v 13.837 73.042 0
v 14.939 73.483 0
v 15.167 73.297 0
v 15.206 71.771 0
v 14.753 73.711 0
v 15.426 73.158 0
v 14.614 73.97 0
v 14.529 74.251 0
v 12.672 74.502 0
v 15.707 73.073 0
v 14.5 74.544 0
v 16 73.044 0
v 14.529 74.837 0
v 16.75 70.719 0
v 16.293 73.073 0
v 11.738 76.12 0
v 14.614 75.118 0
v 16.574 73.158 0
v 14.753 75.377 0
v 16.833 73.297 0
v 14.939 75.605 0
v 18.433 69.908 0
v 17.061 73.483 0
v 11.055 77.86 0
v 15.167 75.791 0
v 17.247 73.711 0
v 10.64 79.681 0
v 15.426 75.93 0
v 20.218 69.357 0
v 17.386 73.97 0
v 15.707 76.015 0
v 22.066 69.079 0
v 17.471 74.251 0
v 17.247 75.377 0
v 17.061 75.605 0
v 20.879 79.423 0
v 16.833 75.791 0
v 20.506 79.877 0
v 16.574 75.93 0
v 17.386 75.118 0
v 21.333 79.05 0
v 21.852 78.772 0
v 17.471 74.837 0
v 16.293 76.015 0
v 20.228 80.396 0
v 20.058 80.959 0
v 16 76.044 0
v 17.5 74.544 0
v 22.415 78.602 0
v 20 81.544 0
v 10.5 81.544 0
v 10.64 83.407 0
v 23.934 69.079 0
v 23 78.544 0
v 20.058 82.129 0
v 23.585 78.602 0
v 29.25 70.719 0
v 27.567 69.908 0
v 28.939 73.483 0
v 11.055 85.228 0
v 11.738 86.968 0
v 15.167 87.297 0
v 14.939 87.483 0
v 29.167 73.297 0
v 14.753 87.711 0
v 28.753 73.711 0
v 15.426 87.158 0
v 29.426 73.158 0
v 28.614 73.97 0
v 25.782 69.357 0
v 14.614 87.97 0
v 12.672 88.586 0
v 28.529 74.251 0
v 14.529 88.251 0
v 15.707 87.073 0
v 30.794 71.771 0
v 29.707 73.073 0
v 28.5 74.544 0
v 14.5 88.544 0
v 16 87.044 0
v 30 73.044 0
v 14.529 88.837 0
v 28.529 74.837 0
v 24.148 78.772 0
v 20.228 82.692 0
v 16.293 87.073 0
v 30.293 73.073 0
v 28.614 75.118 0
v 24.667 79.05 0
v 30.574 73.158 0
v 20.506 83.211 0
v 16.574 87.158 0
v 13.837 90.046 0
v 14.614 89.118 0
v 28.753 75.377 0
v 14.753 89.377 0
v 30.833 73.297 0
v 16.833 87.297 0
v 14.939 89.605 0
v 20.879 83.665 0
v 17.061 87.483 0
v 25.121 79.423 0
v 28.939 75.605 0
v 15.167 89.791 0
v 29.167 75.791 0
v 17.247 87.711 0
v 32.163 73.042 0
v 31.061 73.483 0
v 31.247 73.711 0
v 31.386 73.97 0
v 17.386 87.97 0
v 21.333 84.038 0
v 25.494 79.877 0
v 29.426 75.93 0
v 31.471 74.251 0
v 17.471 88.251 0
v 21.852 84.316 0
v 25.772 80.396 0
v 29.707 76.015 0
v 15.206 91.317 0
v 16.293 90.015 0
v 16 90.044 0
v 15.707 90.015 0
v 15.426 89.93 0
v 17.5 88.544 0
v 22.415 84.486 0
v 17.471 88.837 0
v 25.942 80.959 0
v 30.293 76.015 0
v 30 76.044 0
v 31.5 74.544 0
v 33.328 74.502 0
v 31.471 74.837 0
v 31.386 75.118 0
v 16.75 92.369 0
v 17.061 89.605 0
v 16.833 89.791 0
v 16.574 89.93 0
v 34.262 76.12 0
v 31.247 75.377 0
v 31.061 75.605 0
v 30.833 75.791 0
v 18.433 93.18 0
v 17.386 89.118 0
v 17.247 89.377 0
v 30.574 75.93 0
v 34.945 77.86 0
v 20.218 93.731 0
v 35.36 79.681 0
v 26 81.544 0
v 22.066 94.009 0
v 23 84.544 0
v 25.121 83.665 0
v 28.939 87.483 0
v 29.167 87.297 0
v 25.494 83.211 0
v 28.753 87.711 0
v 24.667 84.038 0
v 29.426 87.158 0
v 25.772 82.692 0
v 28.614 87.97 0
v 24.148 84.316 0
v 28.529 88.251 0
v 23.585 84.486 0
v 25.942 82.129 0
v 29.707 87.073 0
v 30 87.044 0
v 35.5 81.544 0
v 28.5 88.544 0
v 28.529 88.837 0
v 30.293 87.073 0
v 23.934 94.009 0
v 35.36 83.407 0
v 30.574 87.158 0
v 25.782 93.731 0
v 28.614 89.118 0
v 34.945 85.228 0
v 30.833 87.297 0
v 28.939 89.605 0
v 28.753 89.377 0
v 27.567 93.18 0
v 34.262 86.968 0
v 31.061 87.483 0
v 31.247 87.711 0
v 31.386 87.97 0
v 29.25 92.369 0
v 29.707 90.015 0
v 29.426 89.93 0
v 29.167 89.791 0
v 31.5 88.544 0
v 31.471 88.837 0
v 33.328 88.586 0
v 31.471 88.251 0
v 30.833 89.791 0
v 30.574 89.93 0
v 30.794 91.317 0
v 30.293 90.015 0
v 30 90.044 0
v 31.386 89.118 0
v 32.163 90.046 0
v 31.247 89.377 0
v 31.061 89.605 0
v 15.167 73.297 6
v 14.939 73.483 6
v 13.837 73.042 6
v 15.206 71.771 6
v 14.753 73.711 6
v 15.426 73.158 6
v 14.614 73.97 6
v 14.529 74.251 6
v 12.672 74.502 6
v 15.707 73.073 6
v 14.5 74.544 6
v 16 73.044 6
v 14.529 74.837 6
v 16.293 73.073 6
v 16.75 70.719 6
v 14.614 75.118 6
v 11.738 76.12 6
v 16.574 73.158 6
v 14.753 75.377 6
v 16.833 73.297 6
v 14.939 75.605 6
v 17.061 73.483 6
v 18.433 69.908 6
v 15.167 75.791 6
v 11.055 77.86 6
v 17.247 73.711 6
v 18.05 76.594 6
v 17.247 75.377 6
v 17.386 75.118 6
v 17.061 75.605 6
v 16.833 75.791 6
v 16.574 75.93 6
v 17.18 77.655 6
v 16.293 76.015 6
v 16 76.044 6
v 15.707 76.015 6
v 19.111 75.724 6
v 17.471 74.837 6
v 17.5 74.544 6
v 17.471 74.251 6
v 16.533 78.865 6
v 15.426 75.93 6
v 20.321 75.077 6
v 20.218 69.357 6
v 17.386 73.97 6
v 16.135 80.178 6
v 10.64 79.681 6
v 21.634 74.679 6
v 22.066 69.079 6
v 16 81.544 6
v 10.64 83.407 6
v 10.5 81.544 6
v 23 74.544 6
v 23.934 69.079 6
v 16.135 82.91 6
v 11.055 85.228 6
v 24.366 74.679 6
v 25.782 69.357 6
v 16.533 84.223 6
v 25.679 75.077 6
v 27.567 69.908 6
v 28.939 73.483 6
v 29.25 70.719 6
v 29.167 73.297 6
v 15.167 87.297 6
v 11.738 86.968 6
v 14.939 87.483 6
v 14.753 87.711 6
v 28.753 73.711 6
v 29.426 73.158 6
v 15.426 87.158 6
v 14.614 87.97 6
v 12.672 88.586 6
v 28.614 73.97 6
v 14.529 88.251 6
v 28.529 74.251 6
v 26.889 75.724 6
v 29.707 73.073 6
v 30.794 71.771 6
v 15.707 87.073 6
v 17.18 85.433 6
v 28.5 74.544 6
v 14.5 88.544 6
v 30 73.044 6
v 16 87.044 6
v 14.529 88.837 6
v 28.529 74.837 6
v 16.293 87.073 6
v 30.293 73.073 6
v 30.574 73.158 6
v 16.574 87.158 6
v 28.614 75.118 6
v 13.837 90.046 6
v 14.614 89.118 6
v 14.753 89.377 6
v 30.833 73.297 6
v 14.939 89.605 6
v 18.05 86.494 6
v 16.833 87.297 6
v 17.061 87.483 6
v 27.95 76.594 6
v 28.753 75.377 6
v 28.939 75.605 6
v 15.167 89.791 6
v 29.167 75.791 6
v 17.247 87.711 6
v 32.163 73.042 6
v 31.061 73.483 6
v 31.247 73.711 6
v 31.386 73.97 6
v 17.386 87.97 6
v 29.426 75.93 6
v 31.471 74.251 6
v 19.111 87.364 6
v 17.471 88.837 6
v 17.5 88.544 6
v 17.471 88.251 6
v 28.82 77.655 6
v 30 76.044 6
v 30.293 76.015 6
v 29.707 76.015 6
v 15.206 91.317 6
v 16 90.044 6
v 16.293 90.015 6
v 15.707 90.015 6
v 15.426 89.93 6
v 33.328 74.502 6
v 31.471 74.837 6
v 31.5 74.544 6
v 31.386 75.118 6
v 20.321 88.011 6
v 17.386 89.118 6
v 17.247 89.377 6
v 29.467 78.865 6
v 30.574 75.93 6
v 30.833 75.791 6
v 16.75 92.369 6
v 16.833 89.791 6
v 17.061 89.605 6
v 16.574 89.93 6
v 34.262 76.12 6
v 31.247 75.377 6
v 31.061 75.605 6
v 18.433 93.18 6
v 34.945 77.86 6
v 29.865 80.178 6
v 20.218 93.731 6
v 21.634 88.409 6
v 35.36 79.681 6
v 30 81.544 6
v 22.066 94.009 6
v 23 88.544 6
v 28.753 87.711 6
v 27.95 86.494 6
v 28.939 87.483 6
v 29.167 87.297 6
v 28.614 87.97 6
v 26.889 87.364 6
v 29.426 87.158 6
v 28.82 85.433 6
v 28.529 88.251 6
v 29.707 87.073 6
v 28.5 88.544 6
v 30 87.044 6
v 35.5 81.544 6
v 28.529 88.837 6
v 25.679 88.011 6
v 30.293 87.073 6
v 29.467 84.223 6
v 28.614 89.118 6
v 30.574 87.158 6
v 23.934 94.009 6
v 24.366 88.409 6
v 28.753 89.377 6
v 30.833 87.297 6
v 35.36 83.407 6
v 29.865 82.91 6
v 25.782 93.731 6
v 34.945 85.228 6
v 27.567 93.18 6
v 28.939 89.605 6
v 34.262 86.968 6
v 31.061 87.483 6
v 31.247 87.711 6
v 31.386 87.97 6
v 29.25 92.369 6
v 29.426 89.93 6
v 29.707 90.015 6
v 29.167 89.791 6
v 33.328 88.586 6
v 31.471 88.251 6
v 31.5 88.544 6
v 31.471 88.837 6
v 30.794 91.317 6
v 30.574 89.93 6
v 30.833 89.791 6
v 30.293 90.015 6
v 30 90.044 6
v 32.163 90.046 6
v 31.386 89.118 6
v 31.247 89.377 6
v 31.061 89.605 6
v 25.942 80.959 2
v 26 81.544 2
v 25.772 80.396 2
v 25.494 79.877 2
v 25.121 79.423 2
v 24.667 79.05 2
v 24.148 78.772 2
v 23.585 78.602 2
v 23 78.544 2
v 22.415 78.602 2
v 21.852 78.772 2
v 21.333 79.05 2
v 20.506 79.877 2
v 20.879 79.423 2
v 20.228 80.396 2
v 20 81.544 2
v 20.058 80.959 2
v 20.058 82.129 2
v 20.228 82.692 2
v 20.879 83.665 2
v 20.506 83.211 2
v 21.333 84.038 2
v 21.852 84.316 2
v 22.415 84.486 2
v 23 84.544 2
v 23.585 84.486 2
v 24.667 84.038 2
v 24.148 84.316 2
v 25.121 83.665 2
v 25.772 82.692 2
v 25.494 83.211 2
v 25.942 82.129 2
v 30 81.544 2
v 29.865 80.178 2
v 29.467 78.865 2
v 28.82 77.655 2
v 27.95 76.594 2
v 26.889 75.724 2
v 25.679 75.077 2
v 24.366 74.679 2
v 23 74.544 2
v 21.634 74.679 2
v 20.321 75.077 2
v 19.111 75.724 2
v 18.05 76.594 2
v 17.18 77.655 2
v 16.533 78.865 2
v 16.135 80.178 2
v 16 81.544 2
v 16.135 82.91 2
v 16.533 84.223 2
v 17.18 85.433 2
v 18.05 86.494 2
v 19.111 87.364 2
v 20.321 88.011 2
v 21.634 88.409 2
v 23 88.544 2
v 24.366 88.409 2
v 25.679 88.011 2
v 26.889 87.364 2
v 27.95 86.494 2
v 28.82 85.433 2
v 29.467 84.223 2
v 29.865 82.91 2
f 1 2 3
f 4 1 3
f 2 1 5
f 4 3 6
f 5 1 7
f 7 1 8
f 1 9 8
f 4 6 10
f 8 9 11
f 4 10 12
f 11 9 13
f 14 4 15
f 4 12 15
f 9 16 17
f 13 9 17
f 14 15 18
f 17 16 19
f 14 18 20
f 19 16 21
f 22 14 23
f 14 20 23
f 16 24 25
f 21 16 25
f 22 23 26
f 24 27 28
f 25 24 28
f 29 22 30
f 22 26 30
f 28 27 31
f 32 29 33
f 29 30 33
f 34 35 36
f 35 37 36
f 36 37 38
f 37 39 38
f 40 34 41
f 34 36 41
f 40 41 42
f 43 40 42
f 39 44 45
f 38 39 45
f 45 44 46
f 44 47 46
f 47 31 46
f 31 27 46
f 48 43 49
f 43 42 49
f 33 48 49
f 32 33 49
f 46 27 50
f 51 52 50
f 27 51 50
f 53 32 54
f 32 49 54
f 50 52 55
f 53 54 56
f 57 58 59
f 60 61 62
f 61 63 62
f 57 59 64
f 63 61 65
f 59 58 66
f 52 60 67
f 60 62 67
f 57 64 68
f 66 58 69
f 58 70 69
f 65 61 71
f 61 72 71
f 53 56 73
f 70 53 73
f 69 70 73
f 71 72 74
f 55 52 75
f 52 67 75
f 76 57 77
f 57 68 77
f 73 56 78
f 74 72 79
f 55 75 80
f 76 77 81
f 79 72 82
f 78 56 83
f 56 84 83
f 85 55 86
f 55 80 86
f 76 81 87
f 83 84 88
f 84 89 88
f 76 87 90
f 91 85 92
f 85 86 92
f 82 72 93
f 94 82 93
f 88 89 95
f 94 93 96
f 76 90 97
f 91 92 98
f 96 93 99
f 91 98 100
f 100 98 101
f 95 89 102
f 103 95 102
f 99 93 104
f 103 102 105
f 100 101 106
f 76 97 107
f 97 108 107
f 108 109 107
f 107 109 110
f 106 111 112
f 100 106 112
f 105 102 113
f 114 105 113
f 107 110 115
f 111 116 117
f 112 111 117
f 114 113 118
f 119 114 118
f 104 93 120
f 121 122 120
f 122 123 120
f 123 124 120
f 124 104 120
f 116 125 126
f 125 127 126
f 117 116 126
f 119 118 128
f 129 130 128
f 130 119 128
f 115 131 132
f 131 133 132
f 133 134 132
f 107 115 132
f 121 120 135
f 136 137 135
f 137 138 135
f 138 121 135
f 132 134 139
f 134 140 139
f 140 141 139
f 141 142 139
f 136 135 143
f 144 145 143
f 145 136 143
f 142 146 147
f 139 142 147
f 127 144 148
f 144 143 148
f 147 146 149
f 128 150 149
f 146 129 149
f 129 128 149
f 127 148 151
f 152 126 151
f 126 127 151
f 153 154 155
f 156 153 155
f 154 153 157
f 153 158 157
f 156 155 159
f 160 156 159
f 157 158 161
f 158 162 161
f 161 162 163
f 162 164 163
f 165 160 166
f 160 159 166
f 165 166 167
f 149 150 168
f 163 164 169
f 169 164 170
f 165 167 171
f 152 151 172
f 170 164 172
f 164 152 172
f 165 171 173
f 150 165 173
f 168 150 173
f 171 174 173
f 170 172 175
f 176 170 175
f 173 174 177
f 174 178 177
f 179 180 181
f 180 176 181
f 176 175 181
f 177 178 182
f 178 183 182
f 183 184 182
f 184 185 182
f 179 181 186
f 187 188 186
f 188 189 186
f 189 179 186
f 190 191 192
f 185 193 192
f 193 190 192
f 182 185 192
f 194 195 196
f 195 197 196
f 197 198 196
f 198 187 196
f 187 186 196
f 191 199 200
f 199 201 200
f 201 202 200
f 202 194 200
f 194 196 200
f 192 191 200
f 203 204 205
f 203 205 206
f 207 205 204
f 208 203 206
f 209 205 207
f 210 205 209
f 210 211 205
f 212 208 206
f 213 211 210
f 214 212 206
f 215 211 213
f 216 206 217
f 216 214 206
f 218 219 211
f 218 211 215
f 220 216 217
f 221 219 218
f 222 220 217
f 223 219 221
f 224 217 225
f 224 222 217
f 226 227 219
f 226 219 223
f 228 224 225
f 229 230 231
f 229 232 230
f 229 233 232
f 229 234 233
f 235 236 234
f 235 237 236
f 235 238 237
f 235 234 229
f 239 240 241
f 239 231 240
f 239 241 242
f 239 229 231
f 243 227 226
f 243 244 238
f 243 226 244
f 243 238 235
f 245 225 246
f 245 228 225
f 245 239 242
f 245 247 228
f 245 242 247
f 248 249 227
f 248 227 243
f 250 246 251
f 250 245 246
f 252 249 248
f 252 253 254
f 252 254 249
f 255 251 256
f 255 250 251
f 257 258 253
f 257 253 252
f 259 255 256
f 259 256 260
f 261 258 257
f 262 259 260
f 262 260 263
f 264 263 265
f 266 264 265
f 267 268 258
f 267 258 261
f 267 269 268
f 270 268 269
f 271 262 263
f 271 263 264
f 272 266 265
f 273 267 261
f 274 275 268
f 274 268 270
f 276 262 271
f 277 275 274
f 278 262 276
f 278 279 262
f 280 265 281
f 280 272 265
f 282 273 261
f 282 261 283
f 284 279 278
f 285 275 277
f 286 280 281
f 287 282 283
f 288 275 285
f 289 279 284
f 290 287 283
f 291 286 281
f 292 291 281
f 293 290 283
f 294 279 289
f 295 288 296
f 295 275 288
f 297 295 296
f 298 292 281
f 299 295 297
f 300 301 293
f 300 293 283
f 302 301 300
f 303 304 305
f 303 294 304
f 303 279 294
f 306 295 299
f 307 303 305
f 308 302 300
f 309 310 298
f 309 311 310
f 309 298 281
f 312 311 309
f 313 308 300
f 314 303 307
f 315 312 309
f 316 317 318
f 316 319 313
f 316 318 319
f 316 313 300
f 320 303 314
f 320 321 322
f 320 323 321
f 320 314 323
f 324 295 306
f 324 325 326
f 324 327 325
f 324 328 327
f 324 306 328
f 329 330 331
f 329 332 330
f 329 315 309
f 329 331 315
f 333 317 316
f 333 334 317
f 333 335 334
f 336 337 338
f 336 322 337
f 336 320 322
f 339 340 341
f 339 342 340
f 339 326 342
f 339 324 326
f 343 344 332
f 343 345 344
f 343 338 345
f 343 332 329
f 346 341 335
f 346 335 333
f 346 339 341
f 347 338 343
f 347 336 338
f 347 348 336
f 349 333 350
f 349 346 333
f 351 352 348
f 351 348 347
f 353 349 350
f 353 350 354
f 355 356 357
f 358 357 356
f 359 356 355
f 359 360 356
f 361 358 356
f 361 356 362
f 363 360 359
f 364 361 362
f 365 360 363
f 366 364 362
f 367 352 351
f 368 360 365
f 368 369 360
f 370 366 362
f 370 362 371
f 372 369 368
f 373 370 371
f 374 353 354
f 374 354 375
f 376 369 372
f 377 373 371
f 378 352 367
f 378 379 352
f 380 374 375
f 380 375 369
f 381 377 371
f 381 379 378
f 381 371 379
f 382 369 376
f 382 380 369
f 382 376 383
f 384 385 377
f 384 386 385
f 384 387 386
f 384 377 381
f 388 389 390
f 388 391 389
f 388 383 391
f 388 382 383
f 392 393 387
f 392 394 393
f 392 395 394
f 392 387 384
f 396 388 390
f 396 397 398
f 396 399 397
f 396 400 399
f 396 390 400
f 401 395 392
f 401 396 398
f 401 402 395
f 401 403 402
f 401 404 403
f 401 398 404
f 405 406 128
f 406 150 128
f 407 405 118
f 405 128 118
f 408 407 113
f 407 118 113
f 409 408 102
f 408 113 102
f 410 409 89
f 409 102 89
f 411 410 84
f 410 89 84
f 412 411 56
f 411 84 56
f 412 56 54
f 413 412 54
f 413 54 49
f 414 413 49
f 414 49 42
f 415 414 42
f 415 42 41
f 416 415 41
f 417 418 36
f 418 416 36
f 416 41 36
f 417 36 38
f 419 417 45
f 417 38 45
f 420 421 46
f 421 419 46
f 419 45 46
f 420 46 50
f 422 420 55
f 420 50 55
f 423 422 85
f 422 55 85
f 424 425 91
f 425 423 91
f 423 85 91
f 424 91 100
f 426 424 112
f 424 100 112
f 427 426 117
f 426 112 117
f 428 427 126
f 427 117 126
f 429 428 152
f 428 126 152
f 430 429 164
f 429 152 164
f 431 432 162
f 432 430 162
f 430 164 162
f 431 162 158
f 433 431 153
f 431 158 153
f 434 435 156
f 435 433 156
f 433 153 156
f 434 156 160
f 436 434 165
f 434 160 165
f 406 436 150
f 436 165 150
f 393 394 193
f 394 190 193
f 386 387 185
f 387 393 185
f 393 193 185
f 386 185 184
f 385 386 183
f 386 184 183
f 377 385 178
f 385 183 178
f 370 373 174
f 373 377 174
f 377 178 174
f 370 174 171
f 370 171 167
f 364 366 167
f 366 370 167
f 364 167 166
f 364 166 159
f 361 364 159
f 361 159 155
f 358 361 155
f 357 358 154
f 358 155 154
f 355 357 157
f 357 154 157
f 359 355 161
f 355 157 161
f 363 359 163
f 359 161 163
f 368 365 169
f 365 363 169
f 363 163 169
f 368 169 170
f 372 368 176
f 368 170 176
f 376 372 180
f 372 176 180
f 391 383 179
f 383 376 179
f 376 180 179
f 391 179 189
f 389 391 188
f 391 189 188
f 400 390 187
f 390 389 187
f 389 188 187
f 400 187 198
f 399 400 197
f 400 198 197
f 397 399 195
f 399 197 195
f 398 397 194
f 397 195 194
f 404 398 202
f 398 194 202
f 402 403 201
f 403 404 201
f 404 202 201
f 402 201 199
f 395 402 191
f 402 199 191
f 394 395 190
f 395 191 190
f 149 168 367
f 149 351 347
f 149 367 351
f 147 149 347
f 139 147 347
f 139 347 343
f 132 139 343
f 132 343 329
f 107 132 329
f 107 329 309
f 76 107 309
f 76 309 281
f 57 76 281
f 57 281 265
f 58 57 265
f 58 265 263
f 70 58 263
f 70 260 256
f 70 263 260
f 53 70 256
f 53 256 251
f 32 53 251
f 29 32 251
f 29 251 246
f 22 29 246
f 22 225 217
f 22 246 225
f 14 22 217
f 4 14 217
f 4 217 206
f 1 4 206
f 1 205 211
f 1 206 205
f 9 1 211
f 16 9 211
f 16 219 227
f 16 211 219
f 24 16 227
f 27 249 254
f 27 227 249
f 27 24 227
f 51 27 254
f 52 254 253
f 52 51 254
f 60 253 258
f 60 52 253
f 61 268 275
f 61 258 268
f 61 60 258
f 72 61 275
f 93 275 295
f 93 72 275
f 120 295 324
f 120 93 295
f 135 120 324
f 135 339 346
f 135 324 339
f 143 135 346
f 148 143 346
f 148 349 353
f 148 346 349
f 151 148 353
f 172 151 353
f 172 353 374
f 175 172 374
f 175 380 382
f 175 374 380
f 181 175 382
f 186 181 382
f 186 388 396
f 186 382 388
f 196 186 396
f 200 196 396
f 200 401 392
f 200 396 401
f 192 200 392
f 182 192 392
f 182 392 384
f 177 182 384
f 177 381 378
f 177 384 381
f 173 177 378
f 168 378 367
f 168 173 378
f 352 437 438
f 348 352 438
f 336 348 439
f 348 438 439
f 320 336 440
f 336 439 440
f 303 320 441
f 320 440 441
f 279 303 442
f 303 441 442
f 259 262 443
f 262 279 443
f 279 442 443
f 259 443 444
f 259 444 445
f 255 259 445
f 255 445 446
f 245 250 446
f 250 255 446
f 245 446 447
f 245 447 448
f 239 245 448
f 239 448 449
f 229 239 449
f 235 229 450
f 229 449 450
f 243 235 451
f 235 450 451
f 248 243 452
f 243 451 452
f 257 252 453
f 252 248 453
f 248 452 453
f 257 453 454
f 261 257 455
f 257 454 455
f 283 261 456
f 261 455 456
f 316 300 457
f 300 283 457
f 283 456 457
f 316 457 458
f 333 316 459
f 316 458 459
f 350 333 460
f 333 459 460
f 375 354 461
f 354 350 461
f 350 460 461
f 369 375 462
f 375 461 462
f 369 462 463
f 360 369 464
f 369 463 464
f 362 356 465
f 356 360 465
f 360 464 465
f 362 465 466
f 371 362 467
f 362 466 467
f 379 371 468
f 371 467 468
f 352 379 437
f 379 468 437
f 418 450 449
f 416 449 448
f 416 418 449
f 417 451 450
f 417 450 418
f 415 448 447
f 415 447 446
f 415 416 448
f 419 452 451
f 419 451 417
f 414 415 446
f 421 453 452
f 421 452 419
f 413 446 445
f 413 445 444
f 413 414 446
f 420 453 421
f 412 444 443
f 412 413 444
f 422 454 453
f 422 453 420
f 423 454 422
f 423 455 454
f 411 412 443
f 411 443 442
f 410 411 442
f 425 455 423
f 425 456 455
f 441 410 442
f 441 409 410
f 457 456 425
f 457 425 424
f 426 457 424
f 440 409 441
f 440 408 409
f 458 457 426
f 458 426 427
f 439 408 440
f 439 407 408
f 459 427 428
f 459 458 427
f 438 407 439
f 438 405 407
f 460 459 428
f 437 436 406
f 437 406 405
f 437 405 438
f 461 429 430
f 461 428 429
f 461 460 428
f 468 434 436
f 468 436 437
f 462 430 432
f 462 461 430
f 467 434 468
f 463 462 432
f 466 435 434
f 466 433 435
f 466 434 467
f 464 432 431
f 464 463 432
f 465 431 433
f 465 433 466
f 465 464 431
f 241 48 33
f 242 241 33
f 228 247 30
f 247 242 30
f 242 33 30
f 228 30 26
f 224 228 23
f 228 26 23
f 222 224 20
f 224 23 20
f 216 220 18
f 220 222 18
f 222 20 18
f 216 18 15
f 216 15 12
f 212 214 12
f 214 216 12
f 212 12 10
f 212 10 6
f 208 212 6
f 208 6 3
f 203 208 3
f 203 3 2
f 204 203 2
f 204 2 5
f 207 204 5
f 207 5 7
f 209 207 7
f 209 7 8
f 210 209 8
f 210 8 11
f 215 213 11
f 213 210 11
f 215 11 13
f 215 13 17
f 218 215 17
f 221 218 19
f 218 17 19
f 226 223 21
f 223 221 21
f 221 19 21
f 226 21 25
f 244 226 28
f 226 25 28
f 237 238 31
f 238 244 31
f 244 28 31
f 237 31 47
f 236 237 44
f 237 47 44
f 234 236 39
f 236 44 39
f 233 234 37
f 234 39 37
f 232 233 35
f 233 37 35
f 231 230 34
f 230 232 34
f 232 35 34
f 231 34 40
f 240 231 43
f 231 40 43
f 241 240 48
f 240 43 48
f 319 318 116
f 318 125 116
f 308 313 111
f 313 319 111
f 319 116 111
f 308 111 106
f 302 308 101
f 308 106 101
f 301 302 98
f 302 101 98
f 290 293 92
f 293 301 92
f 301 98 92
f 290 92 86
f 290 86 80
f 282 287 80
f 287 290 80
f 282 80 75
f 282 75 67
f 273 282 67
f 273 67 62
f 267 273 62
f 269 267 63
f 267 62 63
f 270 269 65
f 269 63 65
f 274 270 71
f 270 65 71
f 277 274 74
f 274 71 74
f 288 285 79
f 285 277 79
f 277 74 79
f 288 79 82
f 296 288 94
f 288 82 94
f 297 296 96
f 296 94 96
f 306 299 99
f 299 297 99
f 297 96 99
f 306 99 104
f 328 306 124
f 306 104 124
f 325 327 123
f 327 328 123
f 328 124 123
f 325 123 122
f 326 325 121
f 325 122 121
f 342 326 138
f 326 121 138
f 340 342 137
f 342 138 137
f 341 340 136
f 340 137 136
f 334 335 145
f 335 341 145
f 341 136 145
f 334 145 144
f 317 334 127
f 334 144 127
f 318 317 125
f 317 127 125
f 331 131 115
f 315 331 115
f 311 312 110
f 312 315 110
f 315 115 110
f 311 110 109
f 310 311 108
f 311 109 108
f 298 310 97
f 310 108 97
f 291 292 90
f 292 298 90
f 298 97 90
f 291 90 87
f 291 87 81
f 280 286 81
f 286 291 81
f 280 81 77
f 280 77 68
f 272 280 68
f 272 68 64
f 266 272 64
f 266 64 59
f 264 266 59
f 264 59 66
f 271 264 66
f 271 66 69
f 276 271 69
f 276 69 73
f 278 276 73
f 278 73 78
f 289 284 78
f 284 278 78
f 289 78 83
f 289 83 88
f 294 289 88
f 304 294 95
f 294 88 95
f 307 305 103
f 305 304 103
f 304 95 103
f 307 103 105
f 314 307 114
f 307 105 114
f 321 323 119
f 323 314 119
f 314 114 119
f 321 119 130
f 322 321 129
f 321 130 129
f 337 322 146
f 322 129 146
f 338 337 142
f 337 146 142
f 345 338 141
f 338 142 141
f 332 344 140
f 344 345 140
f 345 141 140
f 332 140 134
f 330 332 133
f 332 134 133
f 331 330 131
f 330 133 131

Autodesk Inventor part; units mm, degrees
ref_plane "YZ Plane" through (0, 0, 0) normal (1, 0, 0) x (0, 1, 0)
ref_plane "XZ Plane" through (0, 0, 0) normal (0, 1, 0) x (-1, 0, 0)
ref_plane "XY Plane" through (0, 0, 0) normal (0, 0, 1) x (1, 0, 0)
ref_plane "РабПлоскость1" through (0, 0, 0) normal (0, 0, 1) x (1, 0, 0)
sketch "Эскиз1" plane through (0, 0, 0) normal (0, 0, 1) x (1, 0, 0)
  circle A0 centre (30, 88.544) radius 1.5 projected
  circle A1 centre (30, 74.544) radius 1.5 projected
  circle A2 centre (16, 74.544) radius 1.5 projected
  circle A3 centre (16, 88.544) radius 1.5 projected
  circle A4 centre (23, 81.544) radius 7 projected
  circle A5 centre (23, 81.544) radius 12.5
  circle A6 centre (23, 81.544) radius 3
  point P0 (0, 0)
  dimension "d0" = 25
  dimension "d5" = 6
extrude "Выдавливание1" add sketch "Эскиз1" along normal blind 6 contours A5
extrude "Выдавливание2" add sketch "Эскиз1" along normal blind 2 contours A4
properties part number "подшипник не выпадет"
